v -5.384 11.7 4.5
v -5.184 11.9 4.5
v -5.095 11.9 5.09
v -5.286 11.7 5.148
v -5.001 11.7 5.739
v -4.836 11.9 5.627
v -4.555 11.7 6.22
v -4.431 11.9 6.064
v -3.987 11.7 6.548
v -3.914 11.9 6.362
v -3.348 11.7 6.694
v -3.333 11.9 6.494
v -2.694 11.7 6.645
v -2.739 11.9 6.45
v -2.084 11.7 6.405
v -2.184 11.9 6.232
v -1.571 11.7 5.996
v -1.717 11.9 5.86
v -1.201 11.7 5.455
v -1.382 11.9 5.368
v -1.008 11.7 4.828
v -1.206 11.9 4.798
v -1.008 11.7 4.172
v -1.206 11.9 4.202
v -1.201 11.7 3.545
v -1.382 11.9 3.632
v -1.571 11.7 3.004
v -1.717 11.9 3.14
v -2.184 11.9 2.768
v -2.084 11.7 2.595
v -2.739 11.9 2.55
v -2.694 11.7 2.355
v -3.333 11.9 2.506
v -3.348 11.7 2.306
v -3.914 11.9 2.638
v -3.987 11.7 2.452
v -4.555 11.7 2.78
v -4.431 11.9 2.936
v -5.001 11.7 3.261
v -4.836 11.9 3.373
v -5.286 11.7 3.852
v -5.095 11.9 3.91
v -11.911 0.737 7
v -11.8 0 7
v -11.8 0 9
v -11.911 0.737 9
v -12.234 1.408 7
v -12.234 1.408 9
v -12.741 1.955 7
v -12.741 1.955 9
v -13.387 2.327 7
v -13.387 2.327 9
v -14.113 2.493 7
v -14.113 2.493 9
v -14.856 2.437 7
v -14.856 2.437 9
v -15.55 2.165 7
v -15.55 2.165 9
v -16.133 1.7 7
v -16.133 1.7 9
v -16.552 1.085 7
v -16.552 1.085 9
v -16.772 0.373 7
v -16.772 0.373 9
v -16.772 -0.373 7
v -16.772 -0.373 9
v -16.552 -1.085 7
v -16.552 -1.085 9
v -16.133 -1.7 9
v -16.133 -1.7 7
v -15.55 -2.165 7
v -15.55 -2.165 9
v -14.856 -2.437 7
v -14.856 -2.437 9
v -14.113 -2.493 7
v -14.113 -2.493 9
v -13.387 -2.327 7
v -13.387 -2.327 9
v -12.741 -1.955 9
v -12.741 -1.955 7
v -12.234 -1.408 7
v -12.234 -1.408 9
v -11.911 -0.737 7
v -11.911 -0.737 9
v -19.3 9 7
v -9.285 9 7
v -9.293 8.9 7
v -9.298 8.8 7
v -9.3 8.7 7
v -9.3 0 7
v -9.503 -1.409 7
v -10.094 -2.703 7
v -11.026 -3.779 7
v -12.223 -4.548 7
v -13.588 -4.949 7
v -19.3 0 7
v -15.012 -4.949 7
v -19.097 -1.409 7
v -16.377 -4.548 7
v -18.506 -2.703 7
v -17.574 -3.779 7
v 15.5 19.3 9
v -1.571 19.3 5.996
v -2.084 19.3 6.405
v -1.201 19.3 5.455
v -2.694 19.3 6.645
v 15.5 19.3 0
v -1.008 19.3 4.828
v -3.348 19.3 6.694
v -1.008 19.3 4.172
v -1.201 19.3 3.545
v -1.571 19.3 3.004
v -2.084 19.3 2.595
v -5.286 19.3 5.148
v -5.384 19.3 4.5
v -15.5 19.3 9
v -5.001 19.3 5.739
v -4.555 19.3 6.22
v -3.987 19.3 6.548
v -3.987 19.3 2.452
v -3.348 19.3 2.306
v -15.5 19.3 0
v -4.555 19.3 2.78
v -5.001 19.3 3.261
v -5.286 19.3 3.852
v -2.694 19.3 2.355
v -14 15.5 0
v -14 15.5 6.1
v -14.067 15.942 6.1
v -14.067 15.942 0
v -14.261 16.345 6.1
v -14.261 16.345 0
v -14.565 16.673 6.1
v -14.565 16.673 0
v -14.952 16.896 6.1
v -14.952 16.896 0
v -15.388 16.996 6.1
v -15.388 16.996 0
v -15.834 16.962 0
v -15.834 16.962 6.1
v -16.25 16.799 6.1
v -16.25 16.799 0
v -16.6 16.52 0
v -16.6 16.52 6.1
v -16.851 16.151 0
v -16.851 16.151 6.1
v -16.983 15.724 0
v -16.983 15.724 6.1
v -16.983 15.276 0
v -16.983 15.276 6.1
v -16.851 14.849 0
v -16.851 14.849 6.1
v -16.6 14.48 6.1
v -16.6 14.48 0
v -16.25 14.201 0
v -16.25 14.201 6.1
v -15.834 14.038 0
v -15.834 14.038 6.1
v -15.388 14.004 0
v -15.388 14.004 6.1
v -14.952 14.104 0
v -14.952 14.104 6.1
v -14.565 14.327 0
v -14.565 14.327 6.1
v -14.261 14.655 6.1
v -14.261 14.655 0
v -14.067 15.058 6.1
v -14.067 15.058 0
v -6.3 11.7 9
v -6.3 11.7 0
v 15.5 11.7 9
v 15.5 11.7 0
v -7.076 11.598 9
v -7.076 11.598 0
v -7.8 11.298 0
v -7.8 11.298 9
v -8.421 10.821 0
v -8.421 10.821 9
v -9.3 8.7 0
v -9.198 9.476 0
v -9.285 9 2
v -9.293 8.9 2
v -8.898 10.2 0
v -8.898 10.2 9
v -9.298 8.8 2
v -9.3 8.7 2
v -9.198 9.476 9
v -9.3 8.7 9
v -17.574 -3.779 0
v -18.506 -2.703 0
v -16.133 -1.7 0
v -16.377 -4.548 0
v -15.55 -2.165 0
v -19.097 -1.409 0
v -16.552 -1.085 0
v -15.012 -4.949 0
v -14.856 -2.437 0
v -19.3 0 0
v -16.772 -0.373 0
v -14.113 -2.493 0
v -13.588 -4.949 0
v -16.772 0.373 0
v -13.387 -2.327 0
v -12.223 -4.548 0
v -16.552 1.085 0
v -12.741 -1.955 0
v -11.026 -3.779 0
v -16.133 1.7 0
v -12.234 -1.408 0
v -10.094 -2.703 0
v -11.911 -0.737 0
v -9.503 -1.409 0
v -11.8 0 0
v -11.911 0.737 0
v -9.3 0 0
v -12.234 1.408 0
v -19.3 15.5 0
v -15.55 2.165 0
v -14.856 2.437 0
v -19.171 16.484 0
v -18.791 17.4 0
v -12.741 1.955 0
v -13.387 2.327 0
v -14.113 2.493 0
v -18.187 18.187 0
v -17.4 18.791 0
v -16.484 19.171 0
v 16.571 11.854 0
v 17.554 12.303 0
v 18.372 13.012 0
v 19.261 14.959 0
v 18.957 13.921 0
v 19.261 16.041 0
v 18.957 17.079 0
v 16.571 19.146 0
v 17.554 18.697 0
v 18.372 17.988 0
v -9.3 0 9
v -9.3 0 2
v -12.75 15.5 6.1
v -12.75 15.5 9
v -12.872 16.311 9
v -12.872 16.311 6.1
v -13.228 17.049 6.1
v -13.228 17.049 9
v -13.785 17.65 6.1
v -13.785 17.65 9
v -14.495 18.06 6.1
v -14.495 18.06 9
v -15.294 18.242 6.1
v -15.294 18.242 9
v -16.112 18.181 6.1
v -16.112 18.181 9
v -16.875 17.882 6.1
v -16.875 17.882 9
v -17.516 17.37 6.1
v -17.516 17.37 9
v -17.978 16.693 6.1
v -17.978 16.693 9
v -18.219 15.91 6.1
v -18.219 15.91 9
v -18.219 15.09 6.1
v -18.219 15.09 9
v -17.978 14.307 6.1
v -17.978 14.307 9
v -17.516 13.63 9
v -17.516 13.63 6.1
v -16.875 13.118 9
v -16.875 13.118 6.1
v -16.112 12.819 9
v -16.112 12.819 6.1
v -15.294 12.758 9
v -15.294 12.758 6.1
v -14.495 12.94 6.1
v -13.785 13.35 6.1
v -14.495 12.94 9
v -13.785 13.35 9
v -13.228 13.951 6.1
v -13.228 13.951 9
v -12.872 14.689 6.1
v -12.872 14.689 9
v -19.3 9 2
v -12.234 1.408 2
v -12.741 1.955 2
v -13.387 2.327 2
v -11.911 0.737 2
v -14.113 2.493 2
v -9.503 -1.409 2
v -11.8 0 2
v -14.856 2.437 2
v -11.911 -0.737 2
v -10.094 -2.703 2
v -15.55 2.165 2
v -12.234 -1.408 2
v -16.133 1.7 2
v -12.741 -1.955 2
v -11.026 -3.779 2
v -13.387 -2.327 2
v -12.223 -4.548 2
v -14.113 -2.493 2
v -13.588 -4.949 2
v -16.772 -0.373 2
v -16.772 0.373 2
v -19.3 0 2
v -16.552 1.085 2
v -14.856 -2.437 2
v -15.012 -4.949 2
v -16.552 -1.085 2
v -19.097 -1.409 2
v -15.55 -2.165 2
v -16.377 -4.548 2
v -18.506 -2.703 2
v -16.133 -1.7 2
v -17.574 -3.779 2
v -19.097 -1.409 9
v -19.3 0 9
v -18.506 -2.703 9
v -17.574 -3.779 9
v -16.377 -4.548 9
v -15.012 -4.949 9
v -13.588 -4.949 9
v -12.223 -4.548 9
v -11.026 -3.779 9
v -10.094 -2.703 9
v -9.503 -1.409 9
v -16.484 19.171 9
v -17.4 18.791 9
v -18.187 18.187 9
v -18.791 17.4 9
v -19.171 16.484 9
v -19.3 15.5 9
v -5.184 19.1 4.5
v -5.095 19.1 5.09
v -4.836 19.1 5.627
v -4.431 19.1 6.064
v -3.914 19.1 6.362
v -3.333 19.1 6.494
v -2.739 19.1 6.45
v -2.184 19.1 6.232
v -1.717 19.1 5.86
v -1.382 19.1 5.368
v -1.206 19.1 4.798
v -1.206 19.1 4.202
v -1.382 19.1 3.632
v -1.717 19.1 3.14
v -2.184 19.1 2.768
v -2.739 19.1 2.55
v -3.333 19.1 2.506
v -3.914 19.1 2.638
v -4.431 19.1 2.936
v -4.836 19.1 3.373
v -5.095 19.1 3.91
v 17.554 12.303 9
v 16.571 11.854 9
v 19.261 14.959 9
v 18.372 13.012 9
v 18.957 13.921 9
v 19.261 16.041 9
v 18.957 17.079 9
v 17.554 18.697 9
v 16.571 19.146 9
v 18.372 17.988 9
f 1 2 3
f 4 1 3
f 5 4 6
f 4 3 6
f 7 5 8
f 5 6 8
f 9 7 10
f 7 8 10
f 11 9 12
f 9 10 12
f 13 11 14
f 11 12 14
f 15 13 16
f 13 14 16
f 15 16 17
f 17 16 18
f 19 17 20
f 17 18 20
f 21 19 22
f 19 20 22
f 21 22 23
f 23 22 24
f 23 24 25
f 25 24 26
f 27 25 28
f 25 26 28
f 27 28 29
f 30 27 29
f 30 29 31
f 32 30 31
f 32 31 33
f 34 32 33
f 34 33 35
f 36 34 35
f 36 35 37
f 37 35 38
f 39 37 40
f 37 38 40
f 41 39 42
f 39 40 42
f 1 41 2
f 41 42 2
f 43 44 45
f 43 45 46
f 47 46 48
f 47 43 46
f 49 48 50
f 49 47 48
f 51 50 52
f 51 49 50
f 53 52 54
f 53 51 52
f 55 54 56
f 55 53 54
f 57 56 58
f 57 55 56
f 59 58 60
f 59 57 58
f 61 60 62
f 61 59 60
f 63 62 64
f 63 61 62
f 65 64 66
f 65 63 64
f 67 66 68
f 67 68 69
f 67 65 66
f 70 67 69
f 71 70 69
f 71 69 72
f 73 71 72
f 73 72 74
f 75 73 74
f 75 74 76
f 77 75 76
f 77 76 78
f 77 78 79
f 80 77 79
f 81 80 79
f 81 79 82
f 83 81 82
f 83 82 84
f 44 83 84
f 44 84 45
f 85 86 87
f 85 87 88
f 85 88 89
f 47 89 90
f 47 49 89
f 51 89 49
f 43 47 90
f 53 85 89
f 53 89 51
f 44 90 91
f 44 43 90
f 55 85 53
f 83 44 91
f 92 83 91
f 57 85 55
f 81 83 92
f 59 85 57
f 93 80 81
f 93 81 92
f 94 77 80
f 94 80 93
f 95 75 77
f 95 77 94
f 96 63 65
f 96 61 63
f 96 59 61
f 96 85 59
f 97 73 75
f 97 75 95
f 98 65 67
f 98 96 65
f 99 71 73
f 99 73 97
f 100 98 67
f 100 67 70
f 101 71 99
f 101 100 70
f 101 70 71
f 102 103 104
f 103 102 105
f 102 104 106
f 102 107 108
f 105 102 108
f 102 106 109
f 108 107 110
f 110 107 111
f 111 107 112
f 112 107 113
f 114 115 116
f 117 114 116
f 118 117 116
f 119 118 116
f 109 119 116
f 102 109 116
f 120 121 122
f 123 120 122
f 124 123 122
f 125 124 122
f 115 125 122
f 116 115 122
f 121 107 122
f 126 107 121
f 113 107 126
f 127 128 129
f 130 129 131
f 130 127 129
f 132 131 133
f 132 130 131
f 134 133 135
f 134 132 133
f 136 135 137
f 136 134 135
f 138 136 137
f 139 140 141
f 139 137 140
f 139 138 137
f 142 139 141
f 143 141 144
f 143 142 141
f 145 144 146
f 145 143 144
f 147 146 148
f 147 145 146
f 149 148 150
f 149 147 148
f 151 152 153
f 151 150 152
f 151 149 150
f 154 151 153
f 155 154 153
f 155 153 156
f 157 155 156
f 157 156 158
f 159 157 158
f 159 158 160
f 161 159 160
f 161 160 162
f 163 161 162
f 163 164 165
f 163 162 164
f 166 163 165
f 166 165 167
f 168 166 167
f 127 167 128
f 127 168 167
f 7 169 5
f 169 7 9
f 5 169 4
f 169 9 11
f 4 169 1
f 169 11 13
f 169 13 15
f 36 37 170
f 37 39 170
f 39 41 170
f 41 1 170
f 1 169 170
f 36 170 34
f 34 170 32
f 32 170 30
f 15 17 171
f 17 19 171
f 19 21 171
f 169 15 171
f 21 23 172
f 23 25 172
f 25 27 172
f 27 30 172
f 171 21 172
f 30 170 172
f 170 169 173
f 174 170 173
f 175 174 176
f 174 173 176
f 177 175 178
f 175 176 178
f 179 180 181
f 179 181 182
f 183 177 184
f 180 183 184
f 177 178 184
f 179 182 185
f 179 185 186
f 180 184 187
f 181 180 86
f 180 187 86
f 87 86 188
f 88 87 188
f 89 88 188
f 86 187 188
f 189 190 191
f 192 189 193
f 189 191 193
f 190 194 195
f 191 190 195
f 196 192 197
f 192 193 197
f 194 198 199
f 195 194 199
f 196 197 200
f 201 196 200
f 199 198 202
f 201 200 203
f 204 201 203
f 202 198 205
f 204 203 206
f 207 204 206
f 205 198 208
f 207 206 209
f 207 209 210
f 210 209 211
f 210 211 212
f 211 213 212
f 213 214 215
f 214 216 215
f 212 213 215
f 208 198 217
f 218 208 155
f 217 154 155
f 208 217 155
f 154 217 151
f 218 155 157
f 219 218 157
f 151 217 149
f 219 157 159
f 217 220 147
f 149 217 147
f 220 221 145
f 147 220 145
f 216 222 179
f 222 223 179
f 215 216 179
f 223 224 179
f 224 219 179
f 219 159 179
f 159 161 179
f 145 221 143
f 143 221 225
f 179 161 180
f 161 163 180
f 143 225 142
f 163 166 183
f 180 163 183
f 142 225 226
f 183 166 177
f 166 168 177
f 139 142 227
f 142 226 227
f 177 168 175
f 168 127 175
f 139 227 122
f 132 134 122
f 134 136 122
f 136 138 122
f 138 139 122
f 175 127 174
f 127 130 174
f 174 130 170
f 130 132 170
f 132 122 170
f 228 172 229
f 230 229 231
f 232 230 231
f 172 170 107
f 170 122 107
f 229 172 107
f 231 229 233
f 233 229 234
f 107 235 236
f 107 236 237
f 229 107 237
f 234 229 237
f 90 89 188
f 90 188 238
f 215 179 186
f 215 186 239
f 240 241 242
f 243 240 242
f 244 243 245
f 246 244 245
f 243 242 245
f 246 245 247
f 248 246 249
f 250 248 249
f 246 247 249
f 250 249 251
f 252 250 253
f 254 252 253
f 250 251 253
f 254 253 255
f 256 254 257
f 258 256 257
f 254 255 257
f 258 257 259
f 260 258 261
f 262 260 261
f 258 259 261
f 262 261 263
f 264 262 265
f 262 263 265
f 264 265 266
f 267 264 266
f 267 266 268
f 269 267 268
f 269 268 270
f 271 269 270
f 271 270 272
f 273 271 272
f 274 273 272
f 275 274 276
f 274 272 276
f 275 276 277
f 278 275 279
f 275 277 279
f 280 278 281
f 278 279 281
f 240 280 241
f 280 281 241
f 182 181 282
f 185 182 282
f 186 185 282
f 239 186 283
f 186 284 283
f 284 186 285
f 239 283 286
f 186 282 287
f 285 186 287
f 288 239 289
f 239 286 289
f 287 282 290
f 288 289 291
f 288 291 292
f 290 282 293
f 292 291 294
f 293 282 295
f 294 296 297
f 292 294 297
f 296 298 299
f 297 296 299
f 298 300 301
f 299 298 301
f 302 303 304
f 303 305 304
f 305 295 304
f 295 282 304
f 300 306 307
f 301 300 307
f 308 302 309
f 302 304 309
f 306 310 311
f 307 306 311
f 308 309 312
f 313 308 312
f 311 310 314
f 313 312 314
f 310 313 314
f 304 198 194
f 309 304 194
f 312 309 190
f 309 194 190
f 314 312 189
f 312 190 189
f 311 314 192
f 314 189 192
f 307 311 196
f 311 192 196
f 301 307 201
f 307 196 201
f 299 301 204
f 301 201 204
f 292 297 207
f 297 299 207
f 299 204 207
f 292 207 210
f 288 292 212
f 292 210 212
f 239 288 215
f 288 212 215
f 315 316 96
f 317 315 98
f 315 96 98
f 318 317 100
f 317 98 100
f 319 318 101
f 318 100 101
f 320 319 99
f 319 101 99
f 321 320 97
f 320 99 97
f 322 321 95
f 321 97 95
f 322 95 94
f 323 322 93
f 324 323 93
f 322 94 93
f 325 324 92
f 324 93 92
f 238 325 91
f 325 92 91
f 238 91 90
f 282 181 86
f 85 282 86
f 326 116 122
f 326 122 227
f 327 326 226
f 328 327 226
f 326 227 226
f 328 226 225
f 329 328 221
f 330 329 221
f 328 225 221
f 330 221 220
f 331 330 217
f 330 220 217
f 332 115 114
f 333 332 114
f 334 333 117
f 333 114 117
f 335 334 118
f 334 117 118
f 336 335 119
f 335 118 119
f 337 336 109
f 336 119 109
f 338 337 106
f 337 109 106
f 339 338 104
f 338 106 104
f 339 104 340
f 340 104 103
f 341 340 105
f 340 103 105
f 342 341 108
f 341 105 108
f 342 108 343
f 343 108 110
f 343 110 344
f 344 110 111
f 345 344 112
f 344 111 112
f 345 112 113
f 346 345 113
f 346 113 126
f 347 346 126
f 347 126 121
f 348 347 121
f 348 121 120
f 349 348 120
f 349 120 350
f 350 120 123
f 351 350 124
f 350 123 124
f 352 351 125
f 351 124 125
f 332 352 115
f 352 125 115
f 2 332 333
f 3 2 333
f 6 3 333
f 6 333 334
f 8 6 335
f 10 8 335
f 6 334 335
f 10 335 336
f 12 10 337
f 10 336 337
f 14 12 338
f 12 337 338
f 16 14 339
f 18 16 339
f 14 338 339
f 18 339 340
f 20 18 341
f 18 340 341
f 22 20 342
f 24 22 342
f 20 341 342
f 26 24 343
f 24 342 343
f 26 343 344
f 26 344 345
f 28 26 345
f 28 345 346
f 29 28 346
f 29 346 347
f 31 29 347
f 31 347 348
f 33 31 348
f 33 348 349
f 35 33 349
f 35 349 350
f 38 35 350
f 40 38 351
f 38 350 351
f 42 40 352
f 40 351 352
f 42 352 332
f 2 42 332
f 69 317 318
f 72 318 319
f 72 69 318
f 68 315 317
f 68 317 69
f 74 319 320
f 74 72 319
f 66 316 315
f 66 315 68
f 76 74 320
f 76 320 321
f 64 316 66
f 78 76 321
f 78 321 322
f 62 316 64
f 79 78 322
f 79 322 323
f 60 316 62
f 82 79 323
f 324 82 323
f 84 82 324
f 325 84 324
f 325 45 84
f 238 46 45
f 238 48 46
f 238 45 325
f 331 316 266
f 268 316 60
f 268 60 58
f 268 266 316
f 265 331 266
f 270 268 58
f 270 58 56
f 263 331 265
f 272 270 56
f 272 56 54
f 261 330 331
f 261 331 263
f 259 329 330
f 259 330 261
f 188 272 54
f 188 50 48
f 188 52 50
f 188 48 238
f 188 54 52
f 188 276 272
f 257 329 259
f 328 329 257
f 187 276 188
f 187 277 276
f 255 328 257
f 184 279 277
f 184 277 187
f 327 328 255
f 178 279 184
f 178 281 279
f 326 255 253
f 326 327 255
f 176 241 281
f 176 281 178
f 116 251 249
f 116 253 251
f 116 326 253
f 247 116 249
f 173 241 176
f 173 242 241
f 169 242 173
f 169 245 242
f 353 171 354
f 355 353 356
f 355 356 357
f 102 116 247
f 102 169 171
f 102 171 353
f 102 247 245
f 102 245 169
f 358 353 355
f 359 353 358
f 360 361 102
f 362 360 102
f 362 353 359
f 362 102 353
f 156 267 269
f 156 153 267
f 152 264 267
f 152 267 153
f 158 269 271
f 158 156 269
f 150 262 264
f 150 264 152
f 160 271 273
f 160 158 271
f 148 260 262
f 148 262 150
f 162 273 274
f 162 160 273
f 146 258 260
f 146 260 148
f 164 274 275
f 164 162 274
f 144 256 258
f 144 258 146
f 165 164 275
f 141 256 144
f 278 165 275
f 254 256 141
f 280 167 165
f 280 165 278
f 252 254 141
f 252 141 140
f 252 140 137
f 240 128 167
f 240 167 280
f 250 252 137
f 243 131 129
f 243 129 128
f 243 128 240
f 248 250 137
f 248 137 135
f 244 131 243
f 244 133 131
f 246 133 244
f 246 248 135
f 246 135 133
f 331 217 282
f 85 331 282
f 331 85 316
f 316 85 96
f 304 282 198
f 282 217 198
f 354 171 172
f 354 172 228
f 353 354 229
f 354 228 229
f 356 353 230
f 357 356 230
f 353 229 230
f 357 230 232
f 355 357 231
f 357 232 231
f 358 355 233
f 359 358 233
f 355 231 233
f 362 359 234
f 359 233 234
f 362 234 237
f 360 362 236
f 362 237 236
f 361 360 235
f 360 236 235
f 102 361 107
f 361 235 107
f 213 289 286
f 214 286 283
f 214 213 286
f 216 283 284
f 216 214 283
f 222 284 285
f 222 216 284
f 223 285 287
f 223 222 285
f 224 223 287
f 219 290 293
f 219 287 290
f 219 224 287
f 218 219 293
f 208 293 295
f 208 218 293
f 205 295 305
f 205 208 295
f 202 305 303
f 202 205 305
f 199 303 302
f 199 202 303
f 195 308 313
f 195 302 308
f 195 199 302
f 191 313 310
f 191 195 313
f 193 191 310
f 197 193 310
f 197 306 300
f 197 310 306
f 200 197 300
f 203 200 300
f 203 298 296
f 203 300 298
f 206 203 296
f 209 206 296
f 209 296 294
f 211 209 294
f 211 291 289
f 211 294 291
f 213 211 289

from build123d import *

# Parameters (mm, degrees)
SKETCH_R        = 1.5
SKETCH_R_2      = 2.5
PAD_DEPTH       = 9
FILLET_R        = 3
SKETCH001_W     = 15
SKETCH001_H     = 5
POCKET_DEPTH    = 38.601
SKETCH002_R     = 2
POCKET001_DEPTH = 7.6
CHAMFER_SIZE    = 0.2
SKETCH003_R     = 2.75
POCKET002_DEPTH = 2.9


with BuildPart() as part:
    # Sketch → Pad (new body)
    with BuildSketch(Plane.XY):
        with BuildLine():
            Line((15.5, 19.3), (-15.5, 19.3))
            ThreePointArc((-15.5, 19.3), (-18.187006, 18.187006), (-19.3, 15.5))
            Line((-19.3, 15.5), (-19.3, 0))
            ThreePointArc((-19.3, 0), (-14.3, -5), (-9.3, 0))
            Line((-9.3, 11.7), (-9.3, 0))
            Line((-9.3, 11.7), (15.5, 11.7))
            ThreePointArc((15.5, 11.7), (19.3, 15.5), (15.5, 19.3))
        make_face()
        with Locations((-15.5, 15.5)):
            Circle(SKETCH_R, mode=Mode.SUBTRACT)
        with Locations((-14.3, 0)):
            Circle(SKETCH_R_2, mode=Mode.SUBTRACT)
    extrude(amount=PAD_DEPTH)

    # Fillet
    fillet_edges = [part.edges().sort_by_distance(p)[0] for p in [
        (-9.3, 11.7, 4.5),
    ]]
    fillet(fillet_edges, radius=FILLET_R)

    # Sketch001 → Pocket (cut, through all)
    with BuildSketch(Plane(origin=(-19.3, 0, 0), x_dir=(0, -1, 0), z_dir=(-1, 0, 0))):
        with Locations((-1.5, 4.5)):
            Rectangle(SKETCH001_W, SKETCH001_H)
    extrude(amount=-POCKET_DEPTH, mode=Mode.SUBTRACT)

    # Sketch002 → Pocket001 (cut)
    with BuildSketch(Plane(origin=(0, 19.3, 0), x_dir=(-1, 0, 0), z_dir=(0, 1, 0))):
        with Locations((3.183548, 4.5)):
            Circle(SKETCH002_R)
    extrude(amount=-POCKET001_DEPTH, mode=Mode.SUBTRACT)

    # Chamfer
    chamfer_edges = [part.edges().sort_by_distance(p)[0] for p in [
        (-1.183548, 19.3, 4.5),
        (-1.183548, 11.7, 4.5),
    ]]
    chamfer(chamfer_edges, length=CHAMFER_SIZE)

    # Sketch003 → Pocket002 (cut)
    with BuildSketch(Plane.XY.offset(9)):
        with Locations((-15.5, 15.5)):
            Circle(SKETCH003_R)
    extrude(amount=-POCKET002_DEPTH, mode=Mode.SUBTRACT)


solid = part.part
